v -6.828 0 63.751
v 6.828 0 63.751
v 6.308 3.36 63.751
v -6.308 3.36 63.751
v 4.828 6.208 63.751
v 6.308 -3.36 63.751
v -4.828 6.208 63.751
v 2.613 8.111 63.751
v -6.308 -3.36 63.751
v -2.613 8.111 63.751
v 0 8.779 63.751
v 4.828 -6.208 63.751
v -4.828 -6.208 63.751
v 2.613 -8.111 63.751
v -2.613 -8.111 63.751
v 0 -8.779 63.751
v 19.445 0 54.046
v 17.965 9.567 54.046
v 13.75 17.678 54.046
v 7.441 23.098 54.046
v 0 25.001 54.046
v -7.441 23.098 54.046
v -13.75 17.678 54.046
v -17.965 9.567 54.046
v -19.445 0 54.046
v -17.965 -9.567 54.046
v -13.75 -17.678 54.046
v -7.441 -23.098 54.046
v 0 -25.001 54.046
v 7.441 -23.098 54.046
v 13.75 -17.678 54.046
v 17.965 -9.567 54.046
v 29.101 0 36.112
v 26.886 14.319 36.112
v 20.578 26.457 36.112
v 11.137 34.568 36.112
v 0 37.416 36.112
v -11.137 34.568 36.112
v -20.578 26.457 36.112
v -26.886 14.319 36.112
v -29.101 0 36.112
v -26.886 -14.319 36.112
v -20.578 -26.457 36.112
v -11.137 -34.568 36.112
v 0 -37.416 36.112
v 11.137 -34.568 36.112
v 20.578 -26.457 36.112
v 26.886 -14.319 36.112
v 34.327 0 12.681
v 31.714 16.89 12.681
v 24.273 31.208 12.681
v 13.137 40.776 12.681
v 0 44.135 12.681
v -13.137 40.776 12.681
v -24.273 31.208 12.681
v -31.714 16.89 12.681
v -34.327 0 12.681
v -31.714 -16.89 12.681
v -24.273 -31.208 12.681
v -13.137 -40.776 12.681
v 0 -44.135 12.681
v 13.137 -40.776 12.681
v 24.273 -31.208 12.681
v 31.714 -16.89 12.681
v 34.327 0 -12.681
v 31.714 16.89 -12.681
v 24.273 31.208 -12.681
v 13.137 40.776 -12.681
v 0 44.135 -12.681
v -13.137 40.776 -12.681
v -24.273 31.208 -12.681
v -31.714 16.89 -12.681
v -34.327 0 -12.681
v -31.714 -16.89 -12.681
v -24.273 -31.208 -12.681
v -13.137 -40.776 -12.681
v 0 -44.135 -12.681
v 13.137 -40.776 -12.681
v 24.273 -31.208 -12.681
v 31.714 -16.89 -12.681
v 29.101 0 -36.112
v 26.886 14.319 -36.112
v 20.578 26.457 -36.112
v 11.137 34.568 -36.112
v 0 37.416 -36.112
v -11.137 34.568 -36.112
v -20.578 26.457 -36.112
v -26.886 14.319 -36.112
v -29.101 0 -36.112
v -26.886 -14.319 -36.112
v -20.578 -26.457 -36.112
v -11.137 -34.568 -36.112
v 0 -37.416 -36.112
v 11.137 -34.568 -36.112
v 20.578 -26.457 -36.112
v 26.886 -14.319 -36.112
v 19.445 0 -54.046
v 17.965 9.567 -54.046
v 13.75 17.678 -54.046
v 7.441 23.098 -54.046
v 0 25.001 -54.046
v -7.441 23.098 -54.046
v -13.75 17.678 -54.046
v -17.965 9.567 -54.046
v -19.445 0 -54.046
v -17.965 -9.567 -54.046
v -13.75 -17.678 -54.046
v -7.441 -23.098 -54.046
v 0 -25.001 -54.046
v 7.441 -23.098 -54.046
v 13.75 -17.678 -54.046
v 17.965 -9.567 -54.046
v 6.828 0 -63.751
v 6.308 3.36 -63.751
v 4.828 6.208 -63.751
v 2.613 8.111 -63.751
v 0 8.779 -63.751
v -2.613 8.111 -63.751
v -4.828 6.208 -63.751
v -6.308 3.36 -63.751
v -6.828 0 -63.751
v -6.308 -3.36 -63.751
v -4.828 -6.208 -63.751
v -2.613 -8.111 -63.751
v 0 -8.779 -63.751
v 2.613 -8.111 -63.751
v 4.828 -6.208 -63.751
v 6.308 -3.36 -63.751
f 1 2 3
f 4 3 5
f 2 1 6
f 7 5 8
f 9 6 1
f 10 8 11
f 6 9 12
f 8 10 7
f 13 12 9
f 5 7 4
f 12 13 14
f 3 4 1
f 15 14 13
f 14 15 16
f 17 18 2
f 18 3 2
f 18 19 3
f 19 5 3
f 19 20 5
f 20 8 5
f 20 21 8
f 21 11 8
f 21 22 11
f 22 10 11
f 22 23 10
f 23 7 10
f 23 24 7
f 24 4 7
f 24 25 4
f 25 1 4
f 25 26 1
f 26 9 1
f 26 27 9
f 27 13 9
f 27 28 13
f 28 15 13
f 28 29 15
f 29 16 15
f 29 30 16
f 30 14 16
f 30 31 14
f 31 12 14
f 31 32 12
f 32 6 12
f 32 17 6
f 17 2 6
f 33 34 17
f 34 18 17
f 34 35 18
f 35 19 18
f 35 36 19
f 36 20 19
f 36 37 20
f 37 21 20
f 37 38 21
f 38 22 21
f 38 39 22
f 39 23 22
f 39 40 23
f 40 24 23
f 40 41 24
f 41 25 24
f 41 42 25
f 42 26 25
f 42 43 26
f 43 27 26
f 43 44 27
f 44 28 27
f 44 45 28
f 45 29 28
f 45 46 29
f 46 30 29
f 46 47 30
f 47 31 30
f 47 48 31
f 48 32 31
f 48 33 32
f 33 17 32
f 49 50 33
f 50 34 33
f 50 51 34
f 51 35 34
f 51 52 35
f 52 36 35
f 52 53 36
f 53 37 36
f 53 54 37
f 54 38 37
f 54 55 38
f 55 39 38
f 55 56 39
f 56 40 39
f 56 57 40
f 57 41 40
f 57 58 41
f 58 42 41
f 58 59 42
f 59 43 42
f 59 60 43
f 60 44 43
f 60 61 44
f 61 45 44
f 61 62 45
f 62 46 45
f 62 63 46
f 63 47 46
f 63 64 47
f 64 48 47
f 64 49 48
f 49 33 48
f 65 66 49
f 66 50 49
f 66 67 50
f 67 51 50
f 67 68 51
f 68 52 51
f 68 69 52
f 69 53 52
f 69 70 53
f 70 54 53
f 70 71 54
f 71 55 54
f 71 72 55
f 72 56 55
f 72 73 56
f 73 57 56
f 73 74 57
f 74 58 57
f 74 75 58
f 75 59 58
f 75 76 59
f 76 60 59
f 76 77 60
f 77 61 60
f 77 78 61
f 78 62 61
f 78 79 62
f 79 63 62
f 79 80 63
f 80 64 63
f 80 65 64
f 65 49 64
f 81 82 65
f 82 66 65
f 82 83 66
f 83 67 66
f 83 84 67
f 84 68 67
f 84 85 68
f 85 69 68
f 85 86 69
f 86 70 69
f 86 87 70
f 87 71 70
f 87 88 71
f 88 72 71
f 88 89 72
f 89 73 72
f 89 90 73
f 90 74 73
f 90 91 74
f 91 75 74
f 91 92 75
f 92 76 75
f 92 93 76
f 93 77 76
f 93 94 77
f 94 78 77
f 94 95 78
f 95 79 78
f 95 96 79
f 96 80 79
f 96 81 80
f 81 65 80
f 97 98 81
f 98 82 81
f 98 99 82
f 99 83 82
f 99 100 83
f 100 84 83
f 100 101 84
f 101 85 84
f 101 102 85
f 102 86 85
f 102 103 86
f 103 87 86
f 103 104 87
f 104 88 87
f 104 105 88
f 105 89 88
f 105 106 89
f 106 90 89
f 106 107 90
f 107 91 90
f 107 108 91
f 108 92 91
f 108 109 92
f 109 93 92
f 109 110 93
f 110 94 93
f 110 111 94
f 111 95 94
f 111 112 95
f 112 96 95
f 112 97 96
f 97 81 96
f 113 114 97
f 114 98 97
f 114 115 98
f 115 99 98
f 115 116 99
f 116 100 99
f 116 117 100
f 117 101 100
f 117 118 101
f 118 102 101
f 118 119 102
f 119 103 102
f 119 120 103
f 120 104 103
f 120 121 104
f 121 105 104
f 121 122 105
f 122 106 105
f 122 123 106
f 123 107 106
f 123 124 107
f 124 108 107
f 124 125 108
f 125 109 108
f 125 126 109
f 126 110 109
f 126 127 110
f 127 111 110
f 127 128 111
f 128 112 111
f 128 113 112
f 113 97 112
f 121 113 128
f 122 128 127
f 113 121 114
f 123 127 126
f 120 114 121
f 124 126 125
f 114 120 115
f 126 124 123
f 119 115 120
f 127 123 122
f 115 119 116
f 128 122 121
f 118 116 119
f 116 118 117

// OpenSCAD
// Generated by SolidPython 1.0.1 on 2020-07-29 00:46:47


scale(v = [7, 9, 13]) {
	sphere(r = 5);
}
/***********************************************
*********      SolidPython code:      **********
************************************************
 
# import packages: SolidPython
from solid import *
from solid.utils import *
from itertools import chain, combinations, permutations


class Resize:

    def __init__(self, scad_file):
        self.scad_file = scad_file
        #self.scad_file = import_scad(scad_file)
        # cone/cylinder param:
        self.r1 = 0
        self.r2 = 0
        self.h = 0
        # rectangular prism param:
        self.w = 0
        self.l = 0
        # ellipse param:
        self.r = 0

    # import OpenScad code (file name corresponds to shape)


    # classify shape + parameters
    def assign(self, param1, param2, param3):
        if self.scad_file == 'cone.scad':
            self.r1 = param1
            self.r2 = param2
            self.h = param3
        elif self.scad_file == 'cylinder.scad':
            self.r1 = param1
            self.r2 = param2
            self.h = param3
        elif self.scad_file == 'rectangularPrism.scad':
            self.h = param1
            self.l = param2
            self.w = param3
        else:
            self.r = param1
            self.h = param2

    # resize parameters
    def iterate(self):
        x = range(3, 20, 2)
        i = 1
        if self.scad_file == 'cone.scad':
            tempList = list(permutations(x, 2))
            for temp in tempList:
                param1 = temp[0]
                param2 = temp[1]
                filepath = 'produced_scad_files/' + 'cone' + str(param1) + '_' + str(param2) + '_' + '.scad'
                scad_render_to_file(cylinder(h=param1, r1=param2, r2=0), filepath)

        elif self.scad_file == 'cylinder.scad':
            tempList = list(permutations(x, 3))
            for temp in tempList:
                param1 = temp[0]
                param2 = temp[1]
                filepath = 'produced_scad_files/' + 'cylinder' + str(param1) + '_' + str(param2) + '_' + '.scad'
                scad_render_to_file(cylinder(h=param1, r1=param2, r2=param2), filepath)

        elif self.scad_file == 'rectangularPrism.scad':
            tempList = list(permutations(x, 3))
            for temp in tempList:
                param1 = temp[0]
                param2 = temp[1]
                param3 = temp[2]
                filepath = 'produced_scad_files/' + 'rectangularPrism' + str(param1) + '_' + str(param2) + '_' + str(
                    param3) + '.scad'
                scad_render_to_file(cube(size=(param1, param2, param3)), filepath)

        elif self.scad_file == 'ellipse.scad':
            tempList = list(permutations(x, 4))
            for temp in tempList:
                param1 = temp[0]
                param2 = temp[1]
                param3 = temp[2]
                param4 = temp[3]
                filepath = 'produced_scad_files/' + 'ellipse' + str(param1) + '_' + str(param2) + '_' + str(param3) + '_' + str(param4) + '.scad'
                scad_render_to_file(scale([param1, param2, param3])(sphere(r=param4)), filepath)

    def render_to_scadfile(self):
        scad_render_to_file(scad, 'example.scad') 
 
************************************************/
